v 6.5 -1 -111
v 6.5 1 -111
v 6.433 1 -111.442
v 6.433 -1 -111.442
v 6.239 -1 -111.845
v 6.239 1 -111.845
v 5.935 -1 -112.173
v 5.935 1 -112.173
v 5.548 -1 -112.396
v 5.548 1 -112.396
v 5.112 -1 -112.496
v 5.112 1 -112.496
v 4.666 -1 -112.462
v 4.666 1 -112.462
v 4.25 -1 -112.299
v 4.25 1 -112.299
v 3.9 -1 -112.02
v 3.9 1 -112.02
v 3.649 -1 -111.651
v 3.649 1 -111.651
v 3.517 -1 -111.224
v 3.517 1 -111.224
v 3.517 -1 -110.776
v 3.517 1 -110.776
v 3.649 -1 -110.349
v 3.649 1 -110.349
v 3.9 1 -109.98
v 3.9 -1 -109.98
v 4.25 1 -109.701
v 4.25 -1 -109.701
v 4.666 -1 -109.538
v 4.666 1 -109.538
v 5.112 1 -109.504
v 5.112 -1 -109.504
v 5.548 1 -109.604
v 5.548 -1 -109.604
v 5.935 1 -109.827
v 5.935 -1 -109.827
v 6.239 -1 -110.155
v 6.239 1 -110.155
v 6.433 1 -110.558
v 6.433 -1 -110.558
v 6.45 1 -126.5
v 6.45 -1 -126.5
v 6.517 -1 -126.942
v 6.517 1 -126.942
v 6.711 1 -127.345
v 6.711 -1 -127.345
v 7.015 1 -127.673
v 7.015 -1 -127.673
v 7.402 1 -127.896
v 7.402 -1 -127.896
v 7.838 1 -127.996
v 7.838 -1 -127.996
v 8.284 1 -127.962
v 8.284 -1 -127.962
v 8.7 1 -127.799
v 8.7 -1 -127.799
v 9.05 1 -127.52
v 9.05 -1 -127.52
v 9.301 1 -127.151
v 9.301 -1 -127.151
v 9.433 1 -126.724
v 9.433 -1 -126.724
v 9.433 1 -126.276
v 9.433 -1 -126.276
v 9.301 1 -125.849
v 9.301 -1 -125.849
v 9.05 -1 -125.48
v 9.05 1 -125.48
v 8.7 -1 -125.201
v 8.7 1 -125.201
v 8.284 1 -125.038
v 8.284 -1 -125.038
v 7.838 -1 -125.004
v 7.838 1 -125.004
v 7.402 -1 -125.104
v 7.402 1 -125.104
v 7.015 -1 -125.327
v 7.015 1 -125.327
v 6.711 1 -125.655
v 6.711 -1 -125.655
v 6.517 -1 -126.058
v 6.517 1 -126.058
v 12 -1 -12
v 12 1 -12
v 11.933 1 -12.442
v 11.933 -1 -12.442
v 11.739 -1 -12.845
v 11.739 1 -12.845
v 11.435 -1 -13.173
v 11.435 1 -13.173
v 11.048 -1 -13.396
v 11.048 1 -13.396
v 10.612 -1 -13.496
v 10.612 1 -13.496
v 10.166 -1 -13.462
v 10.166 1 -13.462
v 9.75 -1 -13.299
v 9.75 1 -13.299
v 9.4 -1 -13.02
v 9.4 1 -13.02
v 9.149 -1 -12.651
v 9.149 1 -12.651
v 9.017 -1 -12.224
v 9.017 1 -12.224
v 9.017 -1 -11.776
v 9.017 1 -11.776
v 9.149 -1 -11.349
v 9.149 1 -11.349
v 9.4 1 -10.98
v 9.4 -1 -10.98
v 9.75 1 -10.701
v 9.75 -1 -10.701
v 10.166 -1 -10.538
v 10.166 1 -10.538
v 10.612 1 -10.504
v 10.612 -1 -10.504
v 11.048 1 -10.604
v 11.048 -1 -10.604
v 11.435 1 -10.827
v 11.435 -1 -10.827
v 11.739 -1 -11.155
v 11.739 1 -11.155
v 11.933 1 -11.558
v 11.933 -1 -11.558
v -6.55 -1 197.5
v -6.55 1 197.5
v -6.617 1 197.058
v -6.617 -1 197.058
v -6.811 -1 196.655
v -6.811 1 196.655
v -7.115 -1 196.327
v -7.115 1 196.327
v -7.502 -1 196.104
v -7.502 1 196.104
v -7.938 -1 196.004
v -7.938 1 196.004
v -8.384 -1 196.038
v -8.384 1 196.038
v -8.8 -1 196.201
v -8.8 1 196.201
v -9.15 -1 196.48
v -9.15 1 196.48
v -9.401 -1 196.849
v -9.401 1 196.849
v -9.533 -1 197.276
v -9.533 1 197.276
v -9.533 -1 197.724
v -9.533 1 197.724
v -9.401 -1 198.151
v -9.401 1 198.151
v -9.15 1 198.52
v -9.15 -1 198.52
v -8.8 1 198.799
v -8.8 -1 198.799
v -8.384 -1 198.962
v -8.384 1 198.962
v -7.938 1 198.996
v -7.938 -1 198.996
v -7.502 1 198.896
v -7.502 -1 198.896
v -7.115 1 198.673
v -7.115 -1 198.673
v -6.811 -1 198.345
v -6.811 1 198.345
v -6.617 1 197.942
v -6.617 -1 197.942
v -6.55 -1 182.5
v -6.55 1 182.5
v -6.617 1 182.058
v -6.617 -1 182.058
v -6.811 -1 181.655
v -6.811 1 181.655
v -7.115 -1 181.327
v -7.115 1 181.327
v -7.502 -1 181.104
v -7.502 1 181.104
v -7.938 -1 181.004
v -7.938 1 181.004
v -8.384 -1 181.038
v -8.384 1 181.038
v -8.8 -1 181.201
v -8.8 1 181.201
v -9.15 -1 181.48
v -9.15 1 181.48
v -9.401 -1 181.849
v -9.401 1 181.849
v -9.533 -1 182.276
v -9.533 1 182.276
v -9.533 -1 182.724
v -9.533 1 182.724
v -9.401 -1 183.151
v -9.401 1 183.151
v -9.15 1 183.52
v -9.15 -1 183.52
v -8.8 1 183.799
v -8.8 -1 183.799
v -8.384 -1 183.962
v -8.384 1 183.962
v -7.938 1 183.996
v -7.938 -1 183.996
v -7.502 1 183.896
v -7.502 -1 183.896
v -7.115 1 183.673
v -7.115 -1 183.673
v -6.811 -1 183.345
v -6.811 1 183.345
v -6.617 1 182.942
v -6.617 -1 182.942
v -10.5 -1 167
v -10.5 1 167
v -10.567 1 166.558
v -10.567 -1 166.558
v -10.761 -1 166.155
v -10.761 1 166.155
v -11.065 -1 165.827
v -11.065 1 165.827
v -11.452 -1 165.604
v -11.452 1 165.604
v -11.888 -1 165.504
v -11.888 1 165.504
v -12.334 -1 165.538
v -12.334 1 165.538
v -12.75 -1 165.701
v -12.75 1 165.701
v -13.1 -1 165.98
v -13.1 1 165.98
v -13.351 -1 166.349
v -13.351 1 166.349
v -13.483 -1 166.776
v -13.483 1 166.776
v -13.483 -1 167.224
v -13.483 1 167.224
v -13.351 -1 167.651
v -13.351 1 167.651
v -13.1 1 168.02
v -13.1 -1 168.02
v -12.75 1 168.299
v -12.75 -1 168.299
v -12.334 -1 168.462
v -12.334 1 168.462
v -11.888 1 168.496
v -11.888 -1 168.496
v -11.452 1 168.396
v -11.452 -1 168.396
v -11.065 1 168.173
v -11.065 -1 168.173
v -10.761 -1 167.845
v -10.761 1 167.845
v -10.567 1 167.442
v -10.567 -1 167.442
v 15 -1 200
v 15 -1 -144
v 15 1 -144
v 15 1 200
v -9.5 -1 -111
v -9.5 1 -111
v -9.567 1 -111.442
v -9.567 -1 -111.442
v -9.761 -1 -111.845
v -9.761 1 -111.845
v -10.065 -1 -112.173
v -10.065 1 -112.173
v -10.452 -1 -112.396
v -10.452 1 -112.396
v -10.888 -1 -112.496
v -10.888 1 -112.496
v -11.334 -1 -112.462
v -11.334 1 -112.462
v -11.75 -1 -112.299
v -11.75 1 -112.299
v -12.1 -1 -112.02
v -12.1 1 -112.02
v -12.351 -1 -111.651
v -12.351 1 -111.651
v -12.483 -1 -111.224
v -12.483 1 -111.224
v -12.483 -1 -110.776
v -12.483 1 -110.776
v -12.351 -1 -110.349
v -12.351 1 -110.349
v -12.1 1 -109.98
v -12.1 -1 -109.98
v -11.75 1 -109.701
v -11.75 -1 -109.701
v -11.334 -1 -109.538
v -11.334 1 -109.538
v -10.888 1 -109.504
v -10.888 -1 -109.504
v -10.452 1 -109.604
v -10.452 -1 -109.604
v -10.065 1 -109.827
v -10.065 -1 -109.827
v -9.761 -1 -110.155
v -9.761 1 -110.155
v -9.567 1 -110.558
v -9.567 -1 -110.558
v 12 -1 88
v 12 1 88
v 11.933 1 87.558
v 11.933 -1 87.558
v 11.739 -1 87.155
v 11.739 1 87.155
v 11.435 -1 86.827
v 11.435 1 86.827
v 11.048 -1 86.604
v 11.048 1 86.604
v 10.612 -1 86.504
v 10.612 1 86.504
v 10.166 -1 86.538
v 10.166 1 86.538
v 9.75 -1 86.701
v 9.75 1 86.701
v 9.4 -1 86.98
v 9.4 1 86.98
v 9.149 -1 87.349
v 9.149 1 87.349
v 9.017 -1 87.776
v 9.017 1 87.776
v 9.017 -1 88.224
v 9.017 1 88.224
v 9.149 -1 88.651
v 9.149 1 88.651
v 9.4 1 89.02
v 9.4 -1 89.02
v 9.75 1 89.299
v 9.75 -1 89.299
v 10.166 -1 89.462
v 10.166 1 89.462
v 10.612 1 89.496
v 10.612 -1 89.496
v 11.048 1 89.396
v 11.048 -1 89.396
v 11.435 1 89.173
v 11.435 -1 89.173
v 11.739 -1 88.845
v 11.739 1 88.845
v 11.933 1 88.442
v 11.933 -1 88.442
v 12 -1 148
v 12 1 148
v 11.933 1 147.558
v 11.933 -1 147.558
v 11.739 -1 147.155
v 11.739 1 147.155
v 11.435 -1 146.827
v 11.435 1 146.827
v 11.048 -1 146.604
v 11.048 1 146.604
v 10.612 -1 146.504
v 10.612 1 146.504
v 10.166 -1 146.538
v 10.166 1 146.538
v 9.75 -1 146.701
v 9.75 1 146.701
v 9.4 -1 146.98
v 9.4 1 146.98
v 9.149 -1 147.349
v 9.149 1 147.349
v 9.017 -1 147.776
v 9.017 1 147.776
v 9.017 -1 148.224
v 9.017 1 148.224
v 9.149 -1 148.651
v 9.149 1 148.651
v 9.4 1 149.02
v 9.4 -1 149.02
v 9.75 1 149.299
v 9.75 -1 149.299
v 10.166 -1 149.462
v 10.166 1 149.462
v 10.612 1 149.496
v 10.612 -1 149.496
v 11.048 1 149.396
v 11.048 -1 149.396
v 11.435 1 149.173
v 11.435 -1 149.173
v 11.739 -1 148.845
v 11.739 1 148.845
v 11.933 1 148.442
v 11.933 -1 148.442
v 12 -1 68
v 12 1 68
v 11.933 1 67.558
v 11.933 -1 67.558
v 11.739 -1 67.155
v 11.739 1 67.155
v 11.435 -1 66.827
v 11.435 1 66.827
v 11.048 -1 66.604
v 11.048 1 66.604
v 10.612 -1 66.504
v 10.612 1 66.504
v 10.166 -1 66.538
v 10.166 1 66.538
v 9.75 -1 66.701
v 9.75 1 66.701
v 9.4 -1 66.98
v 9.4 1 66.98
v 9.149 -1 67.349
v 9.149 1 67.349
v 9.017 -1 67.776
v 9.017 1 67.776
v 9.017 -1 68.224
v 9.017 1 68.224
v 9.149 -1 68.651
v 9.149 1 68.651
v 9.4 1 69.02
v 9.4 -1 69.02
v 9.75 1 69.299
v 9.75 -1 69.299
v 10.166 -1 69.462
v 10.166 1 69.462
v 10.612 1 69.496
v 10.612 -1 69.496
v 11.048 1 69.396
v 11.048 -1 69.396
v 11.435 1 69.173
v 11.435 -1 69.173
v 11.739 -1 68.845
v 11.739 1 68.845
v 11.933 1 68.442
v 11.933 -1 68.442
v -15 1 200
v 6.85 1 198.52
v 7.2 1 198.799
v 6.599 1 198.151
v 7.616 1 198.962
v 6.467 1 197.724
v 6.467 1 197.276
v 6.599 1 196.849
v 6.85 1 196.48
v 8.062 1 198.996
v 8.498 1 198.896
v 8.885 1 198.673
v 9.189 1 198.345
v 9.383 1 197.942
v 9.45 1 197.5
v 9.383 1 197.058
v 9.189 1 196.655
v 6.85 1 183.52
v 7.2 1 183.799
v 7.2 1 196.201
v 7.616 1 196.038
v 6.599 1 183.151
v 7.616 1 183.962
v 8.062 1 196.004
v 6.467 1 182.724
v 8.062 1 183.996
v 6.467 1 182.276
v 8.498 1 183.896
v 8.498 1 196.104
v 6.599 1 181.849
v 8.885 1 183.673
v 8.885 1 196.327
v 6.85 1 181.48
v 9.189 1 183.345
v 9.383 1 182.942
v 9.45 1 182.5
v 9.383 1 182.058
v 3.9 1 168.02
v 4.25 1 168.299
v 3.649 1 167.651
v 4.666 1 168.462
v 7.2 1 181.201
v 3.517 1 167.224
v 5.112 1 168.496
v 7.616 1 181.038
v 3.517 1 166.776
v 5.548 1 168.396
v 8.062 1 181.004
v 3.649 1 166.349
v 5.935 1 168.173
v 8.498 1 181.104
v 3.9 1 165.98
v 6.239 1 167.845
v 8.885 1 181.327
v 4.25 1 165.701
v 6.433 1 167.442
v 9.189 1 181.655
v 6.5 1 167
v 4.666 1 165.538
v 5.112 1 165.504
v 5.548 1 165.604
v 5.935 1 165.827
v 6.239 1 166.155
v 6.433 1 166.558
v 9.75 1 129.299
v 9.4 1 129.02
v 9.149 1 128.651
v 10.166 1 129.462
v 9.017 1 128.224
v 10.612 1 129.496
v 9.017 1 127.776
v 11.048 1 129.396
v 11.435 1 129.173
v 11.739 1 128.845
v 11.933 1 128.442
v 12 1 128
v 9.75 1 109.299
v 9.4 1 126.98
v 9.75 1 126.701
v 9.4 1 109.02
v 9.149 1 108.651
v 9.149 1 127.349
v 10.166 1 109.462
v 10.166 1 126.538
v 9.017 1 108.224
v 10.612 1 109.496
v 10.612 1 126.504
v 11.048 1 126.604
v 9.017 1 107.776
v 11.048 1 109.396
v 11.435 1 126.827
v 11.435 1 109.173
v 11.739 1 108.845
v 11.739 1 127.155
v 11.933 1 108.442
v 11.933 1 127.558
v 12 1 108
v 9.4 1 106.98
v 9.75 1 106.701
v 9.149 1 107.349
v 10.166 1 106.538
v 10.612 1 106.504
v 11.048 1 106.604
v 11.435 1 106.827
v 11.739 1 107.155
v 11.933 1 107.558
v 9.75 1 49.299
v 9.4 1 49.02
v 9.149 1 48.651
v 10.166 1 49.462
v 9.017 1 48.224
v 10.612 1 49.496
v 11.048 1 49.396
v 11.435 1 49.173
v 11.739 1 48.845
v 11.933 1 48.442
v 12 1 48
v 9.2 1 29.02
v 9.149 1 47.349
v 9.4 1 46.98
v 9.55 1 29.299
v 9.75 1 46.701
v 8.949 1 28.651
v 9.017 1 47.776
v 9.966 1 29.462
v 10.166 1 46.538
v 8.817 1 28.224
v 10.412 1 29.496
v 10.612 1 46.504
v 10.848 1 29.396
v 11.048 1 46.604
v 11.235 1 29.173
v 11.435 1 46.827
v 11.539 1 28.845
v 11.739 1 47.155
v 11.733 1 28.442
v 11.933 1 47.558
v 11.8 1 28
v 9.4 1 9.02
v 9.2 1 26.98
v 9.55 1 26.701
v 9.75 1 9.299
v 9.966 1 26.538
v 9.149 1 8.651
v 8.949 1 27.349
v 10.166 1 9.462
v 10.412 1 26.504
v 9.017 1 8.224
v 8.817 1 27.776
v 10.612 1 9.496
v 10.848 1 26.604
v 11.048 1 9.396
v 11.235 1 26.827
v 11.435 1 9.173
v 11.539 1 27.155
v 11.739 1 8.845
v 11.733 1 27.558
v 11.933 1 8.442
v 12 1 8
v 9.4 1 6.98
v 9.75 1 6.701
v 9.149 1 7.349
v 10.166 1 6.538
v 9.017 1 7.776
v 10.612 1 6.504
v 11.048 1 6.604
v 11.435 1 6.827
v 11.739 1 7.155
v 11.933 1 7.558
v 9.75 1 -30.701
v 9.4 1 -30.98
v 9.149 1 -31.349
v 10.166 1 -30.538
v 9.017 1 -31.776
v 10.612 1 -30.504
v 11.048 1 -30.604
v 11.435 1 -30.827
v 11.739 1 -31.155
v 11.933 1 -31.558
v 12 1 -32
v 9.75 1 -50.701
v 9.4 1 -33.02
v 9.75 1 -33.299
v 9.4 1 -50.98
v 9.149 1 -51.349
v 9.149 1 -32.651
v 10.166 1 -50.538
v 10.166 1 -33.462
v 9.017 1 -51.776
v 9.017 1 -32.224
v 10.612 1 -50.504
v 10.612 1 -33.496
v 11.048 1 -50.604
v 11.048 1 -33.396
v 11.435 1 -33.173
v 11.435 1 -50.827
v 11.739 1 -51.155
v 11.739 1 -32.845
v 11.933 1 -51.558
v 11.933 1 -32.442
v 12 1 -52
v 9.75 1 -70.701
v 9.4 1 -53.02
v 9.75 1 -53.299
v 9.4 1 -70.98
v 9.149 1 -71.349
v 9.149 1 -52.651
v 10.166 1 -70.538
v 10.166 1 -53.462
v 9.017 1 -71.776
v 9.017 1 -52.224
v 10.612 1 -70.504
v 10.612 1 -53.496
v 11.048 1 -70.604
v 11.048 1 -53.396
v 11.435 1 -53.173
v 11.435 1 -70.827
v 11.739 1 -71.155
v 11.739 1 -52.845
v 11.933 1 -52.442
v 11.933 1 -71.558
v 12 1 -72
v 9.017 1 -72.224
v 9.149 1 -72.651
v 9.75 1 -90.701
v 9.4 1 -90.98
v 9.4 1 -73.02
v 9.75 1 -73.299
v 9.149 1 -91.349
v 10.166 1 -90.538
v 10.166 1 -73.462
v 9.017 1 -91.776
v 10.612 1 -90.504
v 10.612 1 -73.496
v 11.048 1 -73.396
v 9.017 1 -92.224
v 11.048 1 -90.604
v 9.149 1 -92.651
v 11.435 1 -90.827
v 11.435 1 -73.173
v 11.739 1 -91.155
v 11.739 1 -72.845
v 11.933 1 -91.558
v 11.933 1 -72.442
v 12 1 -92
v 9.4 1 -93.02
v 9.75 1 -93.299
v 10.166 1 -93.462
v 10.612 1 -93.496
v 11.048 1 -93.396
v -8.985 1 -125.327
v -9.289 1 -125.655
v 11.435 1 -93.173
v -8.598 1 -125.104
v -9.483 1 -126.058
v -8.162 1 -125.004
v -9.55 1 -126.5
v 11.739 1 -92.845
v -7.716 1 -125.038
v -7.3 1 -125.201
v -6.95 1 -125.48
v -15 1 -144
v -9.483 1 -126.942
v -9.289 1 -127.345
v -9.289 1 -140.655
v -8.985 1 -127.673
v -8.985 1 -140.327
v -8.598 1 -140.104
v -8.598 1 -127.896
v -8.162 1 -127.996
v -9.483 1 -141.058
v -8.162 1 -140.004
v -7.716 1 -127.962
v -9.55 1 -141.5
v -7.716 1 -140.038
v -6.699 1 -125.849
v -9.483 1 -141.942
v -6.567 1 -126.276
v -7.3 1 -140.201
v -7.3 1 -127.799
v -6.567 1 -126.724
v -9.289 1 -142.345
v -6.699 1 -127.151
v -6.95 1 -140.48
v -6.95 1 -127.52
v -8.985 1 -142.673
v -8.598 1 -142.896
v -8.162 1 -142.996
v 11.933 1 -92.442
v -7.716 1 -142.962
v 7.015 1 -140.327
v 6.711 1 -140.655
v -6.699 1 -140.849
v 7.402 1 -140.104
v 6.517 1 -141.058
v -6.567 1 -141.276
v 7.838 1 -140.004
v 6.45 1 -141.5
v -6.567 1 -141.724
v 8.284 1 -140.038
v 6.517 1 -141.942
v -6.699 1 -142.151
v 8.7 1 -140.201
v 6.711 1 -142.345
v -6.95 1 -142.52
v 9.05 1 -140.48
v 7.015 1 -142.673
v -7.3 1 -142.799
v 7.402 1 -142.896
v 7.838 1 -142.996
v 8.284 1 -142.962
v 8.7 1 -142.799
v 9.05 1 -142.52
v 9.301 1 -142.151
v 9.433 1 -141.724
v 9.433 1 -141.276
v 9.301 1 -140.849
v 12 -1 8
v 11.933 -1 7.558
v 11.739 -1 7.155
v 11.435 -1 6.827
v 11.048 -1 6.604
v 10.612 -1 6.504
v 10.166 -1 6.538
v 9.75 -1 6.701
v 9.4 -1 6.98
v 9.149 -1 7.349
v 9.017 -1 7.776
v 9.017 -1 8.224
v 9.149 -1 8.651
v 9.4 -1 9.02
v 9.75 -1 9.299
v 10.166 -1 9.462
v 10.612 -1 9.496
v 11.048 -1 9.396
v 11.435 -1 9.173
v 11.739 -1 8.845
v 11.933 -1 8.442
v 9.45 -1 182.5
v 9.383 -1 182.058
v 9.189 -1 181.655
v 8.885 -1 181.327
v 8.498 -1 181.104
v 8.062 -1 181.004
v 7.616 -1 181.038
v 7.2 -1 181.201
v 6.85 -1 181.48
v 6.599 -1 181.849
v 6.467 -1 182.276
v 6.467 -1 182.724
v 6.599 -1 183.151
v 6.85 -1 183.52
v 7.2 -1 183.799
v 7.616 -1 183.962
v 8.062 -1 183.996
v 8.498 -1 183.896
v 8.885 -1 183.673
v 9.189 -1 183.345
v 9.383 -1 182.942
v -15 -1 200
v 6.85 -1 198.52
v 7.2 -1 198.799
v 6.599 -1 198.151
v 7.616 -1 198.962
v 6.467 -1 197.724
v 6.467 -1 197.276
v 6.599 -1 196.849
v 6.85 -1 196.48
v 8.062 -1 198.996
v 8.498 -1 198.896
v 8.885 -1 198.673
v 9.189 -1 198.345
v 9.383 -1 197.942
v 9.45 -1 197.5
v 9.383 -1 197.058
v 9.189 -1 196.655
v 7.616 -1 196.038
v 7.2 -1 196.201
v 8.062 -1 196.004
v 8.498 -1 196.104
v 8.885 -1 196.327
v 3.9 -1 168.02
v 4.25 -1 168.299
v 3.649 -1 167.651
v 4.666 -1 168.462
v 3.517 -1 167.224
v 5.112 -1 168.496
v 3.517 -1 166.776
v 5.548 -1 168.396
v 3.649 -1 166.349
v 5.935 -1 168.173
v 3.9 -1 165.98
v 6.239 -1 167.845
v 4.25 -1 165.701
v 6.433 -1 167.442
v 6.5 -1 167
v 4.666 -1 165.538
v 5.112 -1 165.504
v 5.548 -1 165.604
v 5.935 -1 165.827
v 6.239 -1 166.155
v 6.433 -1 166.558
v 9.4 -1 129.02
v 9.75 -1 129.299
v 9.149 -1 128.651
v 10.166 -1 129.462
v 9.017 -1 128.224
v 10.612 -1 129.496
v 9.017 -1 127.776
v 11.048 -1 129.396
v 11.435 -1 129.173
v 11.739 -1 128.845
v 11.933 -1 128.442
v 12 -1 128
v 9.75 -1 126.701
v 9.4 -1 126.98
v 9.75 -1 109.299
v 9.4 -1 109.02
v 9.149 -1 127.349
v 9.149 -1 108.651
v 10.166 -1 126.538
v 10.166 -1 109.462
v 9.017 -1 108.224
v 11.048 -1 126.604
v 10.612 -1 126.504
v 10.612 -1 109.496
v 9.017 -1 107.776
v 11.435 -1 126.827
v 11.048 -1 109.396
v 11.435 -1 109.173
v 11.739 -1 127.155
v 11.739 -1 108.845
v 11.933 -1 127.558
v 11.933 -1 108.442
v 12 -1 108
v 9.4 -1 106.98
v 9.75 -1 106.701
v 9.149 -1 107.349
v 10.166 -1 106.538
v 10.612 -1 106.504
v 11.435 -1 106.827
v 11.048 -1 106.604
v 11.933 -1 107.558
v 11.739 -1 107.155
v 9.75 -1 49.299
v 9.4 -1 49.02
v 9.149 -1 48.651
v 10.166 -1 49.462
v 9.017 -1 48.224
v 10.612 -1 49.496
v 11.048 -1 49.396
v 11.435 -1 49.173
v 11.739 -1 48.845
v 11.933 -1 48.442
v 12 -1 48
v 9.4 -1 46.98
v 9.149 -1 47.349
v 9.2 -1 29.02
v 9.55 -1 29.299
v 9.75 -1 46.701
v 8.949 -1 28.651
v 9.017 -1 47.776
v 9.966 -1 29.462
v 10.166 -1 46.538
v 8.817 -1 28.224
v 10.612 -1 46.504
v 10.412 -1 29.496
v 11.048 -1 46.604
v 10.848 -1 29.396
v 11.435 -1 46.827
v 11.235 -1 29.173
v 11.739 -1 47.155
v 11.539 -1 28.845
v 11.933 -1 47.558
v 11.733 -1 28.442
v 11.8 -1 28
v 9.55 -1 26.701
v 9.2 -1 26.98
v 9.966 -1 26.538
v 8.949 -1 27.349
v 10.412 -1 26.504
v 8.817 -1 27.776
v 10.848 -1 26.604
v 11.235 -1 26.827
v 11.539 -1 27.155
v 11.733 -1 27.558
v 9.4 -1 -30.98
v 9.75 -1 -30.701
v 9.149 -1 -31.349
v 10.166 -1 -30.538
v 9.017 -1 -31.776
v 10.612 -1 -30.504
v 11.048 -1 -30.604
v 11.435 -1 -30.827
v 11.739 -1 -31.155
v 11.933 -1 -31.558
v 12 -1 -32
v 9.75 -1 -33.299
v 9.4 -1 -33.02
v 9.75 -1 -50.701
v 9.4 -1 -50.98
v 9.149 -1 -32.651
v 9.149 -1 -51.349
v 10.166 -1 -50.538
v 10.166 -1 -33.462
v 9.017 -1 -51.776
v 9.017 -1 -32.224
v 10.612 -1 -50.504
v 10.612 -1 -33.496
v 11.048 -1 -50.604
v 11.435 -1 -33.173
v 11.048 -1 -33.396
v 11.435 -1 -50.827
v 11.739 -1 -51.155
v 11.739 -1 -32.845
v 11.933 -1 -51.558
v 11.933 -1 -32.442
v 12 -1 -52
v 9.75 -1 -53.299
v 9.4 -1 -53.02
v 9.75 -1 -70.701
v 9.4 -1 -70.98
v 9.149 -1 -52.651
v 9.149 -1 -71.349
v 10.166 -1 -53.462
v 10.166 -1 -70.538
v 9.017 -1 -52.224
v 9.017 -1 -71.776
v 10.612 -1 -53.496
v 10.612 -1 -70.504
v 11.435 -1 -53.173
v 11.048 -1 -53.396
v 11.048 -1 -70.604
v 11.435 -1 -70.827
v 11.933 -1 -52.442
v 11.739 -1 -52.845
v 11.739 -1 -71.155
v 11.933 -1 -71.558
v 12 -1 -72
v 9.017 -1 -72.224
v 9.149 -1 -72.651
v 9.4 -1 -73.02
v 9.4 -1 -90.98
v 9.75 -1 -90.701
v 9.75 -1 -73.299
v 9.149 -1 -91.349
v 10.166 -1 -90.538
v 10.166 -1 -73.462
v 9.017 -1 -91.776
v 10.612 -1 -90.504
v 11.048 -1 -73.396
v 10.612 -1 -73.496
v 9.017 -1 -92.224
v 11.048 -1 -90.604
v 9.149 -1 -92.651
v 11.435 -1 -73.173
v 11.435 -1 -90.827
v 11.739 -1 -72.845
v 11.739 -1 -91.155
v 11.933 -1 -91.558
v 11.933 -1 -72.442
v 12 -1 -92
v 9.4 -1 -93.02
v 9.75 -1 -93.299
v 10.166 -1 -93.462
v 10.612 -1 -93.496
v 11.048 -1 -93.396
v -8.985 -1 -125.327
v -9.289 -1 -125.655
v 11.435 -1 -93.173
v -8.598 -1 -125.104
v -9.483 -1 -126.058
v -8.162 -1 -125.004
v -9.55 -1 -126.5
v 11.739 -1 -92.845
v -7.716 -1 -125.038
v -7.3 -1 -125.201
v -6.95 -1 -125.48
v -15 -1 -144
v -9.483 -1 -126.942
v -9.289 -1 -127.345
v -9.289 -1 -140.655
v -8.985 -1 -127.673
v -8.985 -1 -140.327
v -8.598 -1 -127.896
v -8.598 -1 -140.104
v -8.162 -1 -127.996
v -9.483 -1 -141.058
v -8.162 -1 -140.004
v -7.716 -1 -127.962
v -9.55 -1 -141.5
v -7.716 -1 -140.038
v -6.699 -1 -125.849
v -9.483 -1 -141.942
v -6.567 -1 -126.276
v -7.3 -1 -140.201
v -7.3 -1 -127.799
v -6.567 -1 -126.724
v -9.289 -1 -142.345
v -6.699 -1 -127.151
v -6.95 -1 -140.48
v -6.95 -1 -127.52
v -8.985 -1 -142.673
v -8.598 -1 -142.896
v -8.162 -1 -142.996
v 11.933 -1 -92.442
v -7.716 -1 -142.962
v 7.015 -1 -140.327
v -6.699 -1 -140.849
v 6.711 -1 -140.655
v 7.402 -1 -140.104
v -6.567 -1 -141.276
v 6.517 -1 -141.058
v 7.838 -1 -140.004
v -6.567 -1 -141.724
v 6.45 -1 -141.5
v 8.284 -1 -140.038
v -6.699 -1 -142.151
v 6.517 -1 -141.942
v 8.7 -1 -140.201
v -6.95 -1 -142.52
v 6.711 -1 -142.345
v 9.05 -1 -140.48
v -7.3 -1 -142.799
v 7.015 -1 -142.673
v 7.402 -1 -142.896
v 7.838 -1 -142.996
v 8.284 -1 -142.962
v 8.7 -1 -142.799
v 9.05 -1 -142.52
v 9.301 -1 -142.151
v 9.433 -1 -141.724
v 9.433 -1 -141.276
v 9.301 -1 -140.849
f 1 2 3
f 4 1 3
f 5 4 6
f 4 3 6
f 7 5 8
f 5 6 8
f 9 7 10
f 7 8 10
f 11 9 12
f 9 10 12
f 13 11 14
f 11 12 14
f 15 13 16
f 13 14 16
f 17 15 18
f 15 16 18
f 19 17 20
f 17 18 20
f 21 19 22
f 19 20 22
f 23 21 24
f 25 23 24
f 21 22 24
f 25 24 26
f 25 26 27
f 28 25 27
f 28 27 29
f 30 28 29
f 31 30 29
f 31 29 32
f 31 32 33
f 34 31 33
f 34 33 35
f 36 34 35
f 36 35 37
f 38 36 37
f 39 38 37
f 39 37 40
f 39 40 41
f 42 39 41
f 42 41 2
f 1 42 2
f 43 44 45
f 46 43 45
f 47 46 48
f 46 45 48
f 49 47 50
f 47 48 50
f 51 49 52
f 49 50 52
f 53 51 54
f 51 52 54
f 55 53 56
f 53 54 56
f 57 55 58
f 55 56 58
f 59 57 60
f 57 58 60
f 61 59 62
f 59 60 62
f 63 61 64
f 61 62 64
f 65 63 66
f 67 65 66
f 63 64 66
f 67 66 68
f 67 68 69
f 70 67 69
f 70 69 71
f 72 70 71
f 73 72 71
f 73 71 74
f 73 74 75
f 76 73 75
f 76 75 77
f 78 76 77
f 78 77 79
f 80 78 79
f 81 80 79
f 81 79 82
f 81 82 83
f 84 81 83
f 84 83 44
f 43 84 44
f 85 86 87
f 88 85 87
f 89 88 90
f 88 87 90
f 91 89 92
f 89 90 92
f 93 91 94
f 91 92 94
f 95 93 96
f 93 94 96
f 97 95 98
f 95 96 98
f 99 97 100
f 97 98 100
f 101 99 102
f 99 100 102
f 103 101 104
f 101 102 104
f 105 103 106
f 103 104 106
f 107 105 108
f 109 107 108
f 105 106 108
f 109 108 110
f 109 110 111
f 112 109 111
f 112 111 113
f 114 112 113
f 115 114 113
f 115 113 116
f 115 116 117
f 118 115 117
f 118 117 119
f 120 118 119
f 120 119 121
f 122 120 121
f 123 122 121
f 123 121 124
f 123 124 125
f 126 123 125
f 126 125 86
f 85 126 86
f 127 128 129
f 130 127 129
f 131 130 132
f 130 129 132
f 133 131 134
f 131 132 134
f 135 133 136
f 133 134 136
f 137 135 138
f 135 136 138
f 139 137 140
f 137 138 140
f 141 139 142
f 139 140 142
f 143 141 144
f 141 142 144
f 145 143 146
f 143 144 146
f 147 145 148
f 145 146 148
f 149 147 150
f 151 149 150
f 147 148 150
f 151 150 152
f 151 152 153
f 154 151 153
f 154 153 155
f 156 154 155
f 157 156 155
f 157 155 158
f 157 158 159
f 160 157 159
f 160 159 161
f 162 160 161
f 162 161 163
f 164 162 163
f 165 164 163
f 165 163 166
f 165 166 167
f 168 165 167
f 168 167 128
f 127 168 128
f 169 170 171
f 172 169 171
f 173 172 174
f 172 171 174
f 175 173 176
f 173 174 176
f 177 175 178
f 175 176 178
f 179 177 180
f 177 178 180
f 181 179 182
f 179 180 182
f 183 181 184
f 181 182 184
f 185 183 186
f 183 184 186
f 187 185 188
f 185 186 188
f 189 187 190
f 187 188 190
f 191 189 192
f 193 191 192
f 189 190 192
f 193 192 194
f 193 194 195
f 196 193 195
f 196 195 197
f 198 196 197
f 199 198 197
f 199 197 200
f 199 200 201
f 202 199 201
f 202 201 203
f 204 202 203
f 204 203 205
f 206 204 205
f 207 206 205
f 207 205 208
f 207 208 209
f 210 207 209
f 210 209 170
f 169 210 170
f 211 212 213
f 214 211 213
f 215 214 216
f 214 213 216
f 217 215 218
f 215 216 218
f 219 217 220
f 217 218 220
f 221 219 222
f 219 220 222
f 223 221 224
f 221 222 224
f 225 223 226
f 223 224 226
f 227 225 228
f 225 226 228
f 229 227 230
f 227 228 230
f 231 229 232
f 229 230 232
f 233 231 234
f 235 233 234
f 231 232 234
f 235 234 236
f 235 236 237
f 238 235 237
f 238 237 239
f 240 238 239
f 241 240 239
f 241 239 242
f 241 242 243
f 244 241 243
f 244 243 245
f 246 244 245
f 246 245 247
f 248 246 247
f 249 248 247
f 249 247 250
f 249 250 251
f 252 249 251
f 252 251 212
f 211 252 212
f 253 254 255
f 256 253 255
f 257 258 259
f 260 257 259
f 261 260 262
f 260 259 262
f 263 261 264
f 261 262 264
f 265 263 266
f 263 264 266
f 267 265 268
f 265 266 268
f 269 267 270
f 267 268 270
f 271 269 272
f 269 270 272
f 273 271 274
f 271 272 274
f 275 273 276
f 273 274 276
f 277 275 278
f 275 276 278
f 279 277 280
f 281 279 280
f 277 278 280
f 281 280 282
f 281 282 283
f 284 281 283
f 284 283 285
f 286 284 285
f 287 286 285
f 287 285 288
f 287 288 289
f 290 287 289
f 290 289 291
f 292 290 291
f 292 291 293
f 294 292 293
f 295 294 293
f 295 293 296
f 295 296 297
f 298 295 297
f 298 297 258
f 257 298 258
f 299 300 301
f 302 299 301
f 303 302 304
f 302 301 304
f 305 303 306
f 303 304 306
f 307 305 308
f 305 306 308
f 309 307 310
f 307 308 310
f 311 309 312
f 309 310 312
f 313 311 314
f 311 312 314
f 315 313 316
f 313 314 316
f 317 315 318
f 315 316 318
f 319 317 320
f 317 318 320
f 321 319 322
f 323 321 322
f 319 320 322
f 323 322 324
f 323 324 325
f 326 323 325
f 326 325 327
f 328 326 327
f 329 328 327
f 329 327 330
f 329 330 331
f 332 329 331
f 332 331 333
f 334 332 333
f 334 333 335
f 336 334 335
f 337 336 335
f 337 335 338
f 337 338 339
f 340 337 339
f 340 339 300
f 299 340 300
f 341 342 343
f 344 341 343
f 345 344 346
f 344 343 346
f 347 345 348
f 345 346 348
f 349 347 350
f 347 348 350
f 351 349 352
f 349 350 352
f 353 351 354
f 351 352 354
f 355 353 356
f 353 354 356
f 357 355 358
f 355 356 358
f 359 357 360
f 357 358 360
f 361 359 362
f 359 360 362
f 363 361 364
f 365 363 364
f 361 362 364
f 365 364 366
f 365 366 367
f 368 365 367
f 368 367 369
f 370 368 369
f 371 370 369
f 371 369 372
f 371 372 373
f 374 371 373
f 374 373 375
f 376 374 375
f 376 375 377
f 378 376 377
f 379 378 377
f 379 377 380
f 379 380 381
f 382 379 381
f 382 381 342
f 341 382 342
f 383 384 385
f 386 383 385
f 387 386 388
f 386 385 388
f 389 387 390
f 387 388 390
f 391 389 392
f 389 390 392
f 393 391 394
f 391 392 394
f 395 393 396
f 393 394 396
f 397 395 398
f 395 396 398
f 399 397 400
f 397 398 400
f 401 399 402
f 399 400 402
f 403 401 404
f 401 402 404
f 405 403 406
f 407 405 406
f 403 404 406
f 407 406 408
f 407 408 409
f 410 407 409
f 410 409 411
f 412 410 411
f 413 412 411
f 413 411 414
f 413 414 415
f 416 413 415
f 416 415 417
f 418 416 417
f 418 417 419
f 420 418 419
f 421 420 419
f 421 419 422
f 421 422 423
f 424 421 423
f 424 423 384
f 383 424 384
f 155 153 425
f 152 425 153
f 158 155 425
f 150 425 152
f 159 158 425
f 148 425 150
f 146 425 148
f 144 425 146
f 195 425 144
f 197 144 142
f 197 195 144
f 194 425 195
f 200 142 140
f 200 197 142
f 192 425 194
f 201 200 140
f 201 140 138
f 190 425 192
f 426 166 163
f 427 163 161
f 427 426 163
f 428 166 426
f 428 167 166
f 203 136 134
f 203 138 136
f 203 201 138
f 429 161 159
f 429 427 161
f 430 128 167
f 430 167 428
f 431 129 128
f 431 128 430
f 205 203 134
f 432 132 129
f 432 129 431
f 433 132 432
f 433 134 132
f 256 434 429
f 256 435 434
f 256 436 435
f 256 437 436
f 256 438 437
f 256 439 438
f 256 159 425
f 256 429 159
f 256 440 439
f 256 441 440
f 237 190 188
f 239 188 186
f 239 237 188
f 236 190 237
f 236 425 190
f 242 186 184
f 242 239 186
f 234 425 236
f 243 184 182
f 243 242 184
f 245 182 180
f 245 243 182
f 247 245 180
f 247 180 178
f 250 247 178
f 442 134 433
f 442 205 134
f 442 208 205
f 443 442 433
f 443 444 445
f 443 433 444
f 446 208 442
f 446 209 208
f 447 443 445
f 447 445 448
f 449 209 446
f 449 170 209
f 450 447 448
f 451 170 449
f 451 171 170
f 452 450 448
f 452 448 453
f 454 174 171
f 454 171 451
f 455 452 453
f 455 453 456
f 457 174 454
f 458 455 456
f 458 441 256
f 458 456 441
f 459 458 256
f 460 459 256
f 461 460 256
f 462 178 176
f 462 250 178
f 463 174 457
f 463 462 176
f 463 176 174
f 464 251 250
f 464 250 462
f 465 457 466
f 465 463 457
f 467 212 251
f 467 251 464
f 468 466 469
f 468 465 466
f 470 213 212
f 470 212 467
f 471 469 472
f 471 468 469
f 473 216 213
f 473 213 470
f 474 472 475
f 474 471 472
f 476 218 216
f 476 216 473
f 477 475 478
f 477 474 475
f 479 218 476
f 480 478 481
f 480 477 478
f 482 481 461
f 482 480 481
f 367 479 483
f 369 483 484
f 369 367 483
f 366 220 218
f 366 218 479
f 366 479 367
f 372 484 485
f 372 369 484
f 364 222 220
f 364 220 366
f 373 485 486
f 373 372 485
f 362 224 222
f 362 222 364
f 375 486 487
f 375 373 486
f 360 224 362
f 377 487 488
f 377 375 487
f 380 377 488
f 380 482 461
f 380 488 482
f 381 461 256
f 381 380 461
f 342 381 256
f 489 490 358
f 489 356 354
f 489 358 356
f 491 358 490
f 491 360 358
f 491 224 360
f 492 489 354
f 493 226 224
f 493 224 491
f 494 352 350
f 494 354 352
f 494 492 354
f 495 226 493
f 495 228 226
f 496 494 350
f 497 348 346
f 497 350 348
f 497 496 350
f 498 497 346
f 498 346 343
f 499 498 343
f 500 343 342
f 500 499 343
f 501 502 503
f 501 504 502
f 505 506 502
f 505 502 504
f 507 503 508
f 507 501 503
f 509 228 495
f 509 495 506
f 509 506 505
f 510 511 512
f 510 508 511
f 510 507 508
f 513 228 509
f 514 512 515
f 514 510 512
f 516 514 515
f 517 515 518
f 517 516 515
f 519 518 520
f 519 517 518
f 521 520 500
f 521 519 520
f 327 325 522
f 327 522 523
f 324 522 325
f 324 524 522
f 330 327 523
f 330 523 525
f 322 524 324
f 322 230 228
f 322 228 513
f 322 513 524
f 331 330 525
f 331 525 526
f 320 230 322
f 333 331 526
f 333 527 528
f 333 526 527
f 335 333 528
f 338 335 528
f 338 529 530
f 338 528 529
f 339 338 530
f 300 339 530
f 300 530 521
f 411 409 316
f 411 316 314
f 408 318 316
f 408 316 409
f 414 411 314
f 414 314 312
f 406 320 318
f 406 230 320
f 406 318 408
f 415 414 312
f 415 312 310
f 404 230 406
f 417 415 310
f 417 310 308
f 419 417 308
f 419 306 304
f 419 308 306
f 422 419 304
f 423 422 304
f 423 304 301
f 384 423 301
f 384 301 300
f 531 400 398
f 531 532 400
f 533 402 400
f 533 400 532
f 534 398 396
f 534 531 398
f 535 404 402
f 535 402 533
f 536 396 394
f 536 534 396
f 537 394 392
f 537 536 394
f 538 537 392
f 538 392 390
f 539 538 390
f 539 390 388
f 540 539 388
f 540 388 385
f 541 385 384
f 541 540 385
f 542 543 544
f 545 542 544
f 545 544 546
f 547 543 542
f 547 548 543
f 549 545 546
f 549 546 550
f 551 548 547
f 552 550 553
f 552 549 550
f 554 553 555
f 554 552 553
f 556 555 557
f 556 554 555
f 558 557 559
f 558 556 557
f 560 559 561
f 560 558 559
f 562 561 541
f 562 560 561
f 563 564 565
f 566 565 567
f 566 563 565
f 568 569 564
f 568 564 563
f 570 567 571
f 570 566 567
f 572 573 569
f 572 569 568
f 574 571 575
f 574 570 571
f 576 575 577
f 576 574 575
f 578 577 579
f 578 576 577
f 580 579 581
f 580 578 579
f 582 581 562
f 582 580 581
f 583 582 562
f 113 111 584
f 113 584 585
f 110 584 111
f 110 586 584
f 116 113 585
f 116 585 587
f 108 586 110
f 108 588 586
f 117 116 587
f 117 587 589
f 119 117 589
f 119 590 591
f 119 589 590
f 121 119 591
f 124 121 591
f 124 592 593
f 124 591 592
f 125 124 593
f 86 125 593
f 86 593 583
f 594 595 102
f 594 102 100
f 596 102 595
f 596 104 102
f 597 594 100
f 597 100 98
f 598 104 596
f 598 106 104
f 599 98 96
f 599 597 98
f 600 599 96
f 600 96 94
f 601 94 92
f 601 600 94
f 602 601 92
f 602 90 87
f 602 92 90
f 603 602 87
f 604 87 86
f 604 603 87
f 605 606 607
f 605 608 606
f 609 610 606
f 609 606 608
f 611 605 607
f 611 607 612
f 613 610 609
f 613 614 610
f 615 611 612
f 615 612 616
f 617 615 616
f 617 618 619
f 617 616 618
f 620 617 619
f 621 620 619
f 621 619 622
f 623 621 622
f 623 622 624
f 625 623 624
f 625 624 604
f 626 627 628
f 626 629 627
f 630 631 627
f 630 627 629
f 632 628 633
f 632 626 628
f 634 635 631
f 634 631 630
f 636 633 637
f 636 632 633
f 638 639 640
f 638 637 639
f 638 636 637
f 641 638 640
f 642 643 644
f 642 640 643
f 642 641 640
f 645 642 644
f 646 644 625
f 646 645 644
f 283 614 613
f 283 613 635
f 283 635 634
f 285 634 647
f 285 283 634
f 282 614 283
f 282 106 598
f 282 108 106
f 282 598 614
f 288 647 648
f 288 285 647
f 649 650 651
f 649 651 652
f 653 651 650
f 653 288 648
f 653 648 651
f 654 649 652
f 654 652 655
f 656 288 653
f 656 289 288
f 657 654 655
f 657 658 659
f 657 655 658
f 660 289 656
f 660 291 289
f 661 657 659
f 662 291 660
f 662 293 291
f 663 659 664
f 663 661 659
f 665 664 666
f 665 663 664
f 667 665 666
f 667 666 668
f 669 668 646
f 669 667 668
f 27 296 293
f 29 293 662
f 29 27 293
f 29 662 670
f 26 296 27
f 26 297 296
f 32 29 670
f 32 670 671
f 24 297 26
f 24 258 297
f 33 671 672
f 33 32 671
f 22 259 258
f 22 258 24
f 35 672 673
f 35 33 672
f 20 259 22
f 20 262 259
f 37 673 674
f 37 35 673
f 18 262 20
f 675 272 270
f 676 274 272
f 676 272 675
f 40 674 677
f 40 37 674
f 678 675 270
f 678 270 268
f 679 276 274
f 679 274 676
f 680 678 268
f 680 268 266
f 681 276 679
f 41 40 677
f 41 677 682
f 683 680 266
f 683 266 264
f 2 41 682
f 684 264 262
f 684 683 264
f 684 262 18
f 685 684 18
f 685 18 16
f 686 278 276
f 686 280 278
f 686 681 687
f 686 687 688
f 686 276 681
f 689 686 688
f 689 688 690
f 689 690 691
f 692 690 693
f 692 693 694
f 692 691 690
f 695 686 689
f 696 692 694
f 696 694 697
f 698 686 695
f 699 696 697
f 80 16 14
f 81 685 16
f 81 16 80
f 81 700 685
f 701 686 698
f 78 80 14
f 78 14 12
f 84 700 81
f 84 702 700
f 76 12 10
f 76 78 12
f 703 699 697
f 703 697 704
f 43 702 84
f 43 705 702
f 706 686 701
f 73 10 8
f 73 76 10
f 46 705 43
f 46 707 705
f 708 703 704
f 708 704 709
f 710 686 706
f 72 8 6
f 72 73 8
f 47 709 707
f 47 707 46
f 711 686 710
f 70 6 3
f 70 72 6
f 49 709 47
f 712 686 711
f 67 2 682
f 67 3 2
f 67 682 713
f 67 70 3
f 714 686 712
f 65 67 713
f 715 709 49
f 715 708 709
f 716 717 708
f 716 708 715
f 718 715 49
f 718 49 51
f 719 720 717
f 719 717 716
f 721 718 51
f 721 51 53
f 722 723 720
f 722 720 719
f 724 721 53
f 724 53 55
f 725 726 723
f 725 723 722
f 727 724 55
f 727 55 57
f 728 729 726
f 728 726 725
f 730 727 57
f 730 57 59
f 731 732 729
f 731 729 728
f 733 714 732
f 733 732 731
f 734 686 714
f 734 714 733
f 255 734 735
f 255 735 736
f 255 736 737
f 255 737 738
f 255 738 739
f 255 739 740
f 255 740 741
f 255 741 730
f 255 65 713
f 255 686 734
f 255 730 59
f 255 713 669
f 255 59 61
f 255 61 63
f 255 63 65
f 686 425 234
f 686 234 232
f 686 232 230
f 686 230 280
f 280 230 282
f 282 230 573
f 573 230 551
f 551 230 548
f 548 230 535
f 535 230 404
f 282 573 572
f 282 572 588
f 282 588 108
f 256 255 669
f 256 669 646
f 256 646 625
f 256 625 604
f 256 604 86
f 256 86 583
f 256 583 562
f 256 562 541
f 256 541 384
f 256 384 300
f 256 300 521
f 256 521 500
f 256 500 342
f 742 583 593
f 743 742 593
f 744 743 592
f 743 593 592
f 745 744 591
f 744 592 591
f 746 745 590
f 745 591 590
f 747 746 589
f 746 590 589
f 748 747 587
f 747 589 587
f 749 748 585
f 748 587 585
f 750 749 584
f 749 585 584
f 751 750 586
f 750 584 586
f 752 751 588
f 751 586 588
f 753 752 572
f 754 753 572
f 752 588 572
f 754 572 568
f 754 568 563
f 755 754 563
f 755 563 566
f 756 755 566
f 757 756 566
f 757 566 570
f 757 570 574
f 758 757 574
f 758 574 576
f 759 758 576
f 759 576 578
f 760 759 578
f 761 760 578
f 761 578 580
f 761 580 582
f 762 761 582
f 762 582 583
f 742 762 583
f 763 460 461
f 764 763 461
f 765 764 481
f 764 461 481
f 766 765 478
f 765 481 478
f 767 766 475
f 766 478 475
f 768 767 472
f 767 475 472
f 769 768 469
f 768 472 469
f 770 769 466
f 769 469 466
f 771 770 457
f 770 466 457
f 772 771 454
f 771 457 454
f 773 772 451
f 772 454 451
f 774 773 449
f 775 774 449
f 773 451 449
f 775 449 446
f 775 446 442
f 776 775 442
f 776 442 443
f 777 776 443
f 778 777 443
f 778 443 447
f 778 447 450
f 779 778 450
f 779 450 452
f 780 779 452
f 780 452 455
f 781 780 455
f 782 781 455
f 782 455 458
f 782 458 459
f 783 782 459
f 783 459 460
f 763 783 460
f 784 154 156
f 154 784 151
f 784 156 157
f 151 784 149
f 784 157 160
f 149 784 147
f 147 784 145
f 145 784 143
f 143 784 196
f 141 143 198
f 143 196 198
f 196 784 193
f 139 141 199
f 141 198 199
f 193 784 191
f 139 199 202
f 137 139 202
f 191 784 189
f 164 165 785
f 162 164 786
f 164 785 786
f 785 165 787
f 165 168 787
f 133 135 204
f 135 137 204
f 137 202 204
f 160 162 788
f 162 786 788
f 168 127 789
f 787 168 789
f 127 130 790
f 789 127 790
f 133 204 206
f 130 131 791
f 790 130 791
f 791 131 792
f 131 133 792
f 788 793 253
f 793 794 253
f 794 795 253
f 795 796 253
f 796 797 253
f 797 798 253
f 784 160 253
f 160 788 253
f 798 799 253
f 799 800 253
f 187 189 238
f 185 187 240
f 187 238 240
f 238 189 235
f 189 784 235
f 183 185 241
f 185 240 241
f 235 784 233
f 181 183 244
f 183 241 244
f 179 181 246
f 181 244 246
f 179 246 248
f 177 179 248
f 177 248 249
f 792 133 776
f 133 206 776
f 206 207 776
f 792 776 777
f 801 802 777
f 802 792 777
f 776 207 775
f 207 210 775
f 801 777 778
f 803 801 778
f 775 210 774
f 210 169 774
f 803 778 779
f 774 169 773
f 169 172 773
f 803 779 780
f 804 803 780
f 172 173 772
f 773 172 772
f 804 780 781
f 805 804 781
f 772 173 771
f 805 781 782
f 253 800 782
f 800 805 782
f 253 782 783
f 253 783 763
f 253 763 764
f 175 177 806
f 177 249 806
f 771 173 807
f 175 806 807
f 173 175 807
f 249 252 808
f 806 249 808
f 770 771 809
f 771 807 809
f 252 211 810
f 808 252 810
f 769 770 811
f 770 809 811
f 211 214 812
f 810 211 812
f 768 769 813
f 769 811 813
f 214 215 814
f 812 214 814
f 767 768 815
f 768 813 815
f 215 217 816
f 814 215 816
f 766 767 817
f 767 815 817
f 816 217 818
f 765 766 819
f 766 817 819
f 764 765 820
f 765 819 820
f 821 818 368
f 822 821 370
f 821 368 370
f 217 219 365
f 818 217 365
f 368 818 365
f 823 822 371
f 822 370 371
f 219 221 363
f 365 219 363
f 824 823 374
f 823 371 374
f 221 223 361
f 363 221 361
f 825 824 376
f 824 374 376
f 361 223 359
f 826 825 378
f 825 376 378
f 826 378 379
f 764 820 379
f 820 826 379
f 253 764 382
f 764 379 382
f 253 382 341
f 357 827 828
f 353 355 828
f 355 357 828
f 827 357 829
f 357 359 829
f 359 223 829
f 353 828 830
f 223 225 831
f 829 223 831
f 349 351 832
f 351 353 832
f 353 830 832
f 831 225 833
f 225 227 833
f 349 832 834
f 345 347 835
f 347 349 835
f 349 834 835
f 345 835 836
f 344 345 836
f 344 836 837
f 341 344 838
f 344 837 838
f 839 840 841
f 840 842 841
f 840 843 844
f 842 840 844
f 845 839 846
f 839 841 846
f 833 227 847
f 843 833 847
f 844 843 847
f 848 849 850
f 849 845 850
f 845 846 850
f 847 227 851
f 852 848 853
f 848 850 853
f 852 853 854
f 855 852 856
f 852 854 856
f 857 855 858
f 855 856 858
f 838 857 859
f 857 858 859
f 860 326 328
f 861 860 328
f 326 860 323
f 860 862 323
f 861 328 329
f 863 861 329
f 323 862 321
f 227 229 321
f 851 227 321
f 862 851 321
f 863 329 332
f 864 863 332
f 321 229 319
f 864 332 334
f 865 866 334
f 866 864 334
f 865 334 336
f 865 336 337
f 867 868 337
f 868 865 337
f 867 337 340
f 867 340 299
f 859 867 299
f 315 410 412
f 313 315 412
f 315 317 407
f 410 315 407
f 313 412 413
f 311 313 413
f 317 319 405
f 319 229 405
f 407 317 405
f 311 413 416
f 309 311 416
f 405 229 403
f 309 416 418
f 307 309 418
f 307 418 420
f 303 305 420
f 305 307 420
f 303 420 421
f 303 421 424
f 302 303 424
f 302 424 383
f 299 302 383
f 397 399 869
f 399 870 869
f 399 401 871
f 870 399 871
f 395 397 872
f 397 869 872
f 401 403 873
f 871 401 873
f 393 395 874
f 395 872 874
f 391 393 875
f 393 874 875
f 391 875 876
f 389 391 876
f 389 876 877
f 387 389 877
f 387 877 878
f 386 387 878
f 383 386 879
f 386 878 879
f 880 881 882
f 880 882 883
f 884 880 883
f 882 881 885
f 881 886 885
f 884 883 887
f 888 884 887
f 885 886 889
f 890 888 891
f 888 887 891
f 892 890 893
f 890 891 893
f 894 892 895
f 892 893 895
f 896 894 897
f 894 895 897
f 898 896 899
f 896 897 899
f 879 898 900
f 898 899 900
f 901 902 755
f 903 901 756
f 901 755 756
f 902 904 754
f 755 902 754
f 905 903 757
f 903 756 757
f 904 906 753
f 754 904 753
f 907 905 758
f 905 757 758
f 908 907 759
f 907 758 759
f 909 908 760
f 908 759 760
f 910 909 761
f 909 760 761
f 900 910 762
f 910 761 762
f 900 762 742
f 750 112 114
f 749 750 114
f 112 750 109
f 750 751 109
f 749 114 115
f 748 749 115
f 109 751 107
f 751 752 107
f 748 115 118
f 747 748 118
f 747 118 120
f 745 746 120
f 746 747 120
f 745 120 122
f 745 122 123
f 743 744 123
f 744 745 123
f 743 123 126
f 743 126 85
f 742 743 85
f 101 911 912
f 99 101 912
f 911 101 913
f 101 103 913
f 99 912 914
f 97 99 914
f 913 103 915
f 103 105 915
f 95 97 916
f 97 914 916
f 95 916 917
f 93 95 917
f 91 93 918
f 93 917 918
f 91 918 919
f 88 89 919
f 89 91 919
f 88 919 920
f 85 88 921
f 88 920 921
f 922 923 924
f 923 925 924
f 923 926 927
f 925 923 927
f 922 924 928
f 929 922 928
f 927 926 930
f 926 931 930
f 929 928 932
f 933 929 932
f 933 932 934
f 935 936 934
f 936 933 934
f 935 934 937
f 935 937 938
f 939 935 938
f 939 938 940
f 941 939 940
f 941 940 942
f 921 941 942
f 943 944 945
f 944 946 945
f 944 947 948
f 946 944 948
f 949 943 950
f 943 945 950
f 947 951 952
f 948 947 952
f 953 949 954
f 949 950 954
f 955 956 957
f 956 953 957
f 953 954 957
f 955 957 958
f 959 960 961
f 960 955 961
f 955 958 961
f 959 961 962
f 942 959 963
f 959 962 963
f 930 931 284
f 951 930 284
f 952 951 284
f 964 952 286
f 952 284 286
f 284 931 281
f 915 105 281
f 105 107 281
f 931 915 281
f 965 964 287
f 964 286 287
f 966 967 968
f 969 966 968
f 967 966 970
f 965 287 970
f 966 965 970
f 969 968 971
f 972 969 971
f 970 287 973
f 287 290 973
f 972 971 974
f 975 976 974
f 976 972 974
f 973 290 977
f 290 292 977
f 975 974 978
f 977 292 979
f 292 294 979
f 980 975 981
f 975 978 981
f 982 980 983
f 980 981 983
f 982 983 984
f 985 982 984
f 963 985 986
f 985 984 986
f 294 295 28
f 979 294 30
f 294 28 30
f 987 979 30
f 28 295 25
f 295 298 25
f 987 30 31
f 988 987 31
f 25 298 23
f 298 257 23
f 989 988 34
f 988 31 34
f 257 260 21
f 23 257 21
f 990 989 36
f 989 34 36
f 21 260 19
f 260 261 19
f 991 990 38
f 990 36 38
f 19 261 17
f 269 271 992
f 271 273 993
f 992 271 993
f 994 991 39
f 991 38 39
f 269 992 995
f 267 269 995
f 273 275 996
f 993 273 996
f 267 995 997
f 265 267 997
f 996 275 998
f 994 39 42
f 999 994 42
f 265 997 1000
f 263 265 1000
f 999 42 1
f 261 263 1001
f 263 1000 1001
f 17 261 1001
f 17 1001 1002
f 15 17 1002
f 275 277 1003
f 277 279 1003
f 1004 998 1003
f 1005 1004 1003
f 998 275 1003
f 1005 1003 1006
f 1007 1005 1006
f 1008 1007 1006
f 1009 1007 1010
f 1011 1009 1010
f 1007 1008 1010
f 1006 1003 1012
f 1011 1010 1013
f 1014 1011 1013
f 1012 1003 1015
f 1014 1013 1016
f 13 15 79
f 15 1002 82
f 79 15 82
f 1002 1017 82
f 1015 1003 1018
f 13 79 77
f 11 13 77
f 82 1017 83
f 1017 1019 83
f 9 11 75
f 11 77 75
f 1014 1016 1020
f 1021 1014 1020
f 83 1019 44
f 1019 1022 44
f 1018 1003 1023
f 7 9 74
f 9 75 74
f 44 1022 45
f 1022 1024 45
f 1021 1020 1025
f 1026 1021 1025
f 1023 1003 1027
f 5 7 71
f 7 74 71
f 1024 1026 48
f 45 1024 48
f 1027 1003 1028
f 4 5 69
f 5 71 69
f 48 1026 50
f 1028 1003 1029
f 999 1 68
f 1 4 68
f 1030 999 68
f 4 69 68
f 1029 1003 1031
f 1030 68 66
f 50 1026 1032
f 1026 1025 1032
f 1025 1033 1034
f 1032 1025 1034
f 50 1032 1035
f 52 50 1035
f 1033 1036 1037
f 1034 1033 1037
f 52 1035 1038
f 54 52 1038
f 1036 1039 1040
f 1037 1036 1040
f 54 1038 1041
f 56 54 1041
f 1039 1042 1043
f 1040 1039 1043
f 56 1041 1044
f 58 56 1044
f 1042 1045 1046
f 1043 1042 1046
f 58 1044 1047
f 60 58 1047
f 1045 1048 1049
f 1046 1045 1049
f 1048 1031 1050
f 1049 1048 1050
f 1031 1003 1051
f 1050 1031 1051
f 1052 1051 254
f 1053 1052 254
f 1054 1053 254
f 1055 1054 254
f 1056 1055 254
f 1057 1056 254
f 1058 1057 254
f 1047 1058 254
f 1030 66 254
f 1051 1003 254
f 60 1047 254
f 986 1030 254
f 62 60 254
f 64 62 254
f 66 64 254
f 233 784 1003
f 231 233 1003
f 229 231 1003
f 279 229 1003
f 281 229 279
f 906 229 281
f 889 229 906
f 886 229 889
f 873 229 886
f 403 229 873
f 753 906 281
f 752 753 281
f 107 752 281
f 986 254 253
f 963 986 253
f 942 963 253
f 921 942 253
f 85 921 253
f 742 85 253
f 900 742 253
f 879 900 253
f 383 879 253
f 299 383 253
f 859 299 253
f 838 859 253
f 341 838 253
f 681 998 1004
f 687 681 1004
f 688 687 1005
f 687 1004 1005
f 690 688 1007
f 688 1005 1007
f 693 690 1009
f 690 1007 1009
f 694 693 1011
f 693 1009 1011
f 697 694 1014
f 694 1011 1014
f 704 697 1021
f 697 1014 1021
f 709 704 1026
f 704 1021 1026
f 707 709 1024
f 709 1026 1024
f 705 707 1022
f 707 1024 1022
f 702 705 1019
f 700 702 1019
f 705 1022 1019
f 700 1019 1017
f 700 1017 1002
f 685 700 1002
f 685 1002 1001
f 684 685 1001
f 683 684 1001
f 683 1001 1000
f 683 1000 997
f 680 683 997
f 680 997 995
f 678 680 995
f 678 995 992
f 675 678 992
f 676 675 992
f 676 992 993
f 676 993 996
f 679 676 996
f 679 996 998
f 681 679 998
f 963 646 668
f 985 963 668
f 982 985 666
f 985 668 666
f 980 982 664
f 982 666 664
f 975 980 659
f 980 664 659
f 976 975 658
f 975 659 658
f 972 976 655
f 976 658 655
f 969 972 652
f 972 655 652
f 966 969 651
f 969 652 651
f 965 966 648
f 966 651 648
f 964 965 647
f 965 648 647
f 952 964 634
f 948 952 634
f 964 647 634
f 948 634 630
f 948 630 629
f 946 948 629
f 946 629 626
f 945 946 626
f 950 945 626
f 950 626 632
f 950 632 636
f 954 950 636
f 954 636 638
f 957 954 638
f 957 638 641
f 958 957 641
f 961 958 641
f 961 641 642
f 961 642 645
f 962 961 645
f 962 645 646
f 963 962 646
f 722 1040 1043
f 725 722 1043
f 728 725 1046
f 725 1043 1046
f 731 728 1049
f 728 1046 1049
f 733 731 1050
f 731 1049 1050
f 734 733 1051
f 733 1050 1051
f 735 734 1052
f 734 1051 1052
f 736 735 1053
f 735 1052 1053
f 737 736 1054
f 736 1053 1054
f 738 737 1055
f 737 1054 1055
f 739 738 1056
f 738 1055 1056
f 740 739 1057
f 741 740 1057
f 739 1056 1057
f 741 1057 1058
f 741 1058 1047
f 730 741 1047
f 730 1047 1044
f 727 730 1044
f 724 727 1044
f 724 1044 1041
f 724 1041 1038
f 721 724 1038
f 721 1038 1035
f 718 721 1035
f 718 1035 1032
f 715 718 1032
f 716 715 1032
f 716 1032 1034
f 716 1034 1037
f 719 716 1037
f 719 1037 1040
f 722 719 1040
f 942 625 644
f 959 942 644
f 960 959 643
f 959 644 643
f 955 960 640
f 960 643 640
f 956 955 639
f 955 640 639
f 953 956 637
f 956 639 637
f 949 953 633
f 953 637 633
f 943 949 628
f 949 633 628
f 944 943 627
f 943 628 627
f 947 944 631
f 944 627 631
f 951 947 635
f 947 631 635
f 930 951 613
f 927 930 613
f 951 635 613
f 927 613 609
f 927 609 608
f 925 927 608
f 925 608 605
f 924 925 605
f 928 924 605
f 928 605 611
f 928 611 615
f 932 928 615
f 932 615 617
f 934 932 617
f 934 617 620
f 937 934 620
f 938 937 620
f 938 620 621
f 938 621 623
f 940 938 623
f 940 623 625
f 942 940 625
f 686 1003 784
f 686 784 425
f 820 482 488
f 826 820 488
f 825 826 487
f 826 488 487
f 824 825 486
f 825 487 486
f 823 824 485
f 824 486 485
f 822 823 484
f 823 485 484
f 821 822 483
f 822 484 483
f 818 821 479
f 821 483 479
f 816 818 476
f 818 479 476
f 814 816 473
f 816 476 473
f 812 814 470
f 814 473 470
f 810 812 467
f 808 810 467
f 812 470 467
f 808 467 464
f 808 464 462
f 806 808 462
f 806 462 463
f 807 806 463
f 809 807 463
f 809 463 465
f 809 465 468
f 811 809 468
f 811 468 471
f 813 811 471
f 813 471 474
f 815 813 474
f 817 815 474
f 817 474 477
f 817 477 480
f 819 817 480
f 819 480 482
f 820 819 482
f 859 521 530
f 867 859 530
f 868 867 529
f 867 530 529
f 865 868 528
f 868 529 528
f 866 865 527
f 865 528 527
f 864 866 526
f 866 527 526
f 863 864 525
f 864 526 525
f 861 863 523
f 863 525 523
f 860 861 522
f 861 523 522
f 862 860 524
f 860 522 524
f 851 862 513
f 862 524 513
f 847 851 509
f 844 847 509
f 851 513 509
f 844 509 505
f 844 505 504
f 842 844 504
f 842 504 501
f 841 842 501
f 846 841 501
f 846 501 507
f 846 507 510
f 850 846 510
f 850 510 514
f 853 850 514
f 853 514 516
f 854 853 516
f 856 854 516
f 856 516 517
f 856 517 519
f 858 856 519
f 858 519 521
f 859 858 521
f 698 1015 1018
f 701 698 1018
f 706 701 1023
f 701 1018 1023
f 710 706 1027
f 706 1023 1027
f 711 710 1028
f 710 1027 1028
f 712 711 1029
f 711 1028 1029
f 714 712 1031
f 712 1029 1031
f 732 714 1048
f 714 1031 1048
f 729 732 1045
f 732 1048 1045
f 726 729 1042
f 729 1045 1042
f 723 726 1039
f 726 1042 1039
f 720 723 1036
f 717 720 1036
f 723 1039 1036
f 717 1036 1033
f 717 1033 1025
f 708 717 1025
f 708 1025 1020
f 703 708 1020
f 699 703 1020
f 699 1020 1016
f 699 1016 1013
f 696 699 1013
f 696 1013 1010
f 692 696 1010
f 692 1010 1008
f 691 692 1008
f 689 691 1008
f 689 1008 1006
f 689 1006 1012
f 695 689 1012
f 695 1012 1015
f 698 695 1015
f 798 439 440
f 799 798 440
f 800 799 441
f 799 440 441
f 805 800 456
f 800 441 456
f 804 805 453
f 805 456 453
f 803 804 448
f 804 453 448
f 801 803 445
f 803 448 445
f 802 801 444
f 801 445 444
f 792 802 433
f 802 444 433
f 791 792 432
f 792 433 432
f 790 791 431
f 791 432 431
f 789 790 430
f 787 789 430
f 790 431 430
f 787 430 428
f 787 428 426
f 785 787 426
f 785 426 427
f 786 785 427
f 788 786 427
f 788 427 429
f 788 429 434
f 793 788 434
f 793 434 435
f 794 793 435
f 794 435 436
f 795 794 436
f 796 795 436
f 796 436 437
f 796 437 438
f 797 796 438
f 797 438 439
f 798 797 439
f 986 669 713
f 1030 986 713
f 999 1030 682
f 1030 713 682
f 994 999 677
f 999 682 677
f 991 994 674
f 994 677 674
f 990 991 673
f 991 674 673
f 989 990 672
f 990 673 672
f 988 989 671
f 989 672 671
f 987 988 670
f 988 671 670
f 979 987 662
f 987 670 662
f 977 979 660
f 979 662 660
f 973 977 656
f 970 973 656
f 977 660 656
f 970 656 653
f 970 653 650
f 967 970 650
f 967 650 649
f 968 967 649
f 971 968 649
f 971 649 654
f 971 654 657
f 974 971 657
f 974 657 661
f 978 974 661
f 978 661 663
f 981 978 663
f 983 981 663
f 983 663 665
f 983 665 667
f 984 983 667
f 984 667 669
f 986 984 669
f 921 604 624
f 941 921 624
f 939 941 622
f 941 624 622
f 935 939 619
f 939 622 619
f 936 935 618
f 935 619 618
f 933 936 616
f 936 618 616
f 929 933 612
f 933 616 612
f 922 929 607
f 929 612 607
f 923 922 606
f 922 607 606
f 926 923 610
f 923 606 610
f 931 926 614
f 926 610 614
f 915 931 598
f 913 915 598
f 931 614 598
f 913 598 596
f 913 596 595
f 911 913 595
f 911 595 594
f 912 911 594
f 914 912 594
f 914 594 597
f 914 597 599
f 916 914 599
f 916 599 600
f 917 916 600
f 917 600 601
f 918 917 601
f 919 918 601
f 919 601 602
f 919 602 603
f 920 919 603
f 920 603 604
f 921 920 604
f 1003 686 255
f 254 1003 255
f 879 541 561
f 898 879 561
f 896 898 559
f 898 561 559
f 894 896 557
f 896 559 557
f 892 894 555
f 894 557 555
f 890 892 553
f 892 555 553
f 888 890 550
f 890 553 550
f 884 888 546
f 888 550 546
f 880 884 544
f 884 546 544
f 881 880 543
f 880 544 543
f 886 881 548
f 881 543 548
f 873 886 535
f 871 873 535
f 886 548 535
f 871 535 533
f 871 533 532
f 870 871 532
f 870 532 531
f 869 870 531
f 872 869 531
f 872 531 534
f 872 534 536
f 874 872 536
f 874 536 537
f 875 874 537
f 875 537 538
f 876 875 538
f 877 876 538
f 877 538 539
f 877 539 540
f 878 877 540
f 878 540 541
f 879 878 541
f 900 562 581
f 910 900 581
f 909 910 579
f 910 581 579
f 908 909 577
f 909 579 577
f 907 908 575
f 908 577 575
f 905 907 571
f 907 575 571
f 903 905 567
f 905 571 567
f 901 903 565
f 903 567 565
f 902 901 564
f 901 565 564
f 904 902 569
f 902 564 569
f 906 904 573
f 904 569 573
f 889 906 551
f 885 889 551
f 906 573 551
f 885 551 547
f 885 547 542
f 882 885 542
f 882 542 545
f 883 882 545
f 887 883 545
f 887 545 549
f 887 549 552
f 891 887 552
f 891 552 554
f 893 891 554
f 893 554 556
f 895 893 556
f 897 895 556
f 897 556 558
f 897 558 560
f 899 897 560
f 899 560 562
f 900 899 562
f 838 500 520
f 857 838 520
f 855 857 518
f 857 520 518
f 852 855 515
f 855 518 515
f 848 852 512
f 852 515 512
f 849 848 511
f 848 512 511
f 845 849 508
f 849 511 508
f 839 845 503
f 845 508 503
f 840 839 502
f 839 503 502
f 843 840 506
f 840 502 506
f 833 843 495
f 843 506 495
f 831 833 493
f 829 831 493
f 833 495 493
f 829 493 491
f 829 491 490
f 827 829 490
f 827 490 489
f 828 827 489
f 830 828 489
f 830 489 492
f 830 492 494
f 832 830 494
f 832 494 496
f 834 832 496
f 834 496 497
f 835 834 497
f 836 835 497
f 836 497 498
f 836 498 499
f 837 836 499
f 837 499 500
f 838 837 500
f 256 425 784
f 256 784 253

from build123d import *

# Parameters (mm, degrees)
BOSS_EXTRUDE1_DEPTH      = 200
BOSS_EXTRUDE1_DEPTH_BACK = 144
SKETCH1_W                = 30
SKETCH1_H                = 2
F_3_0_3_DIAMETER_SLOT1_D = 3
F_3_0MM_DOWEL_HOLE1_D    = 3


with BuildPart() as part:
    # Sketch1 → Boss-Extrude1 (new, two sides: drawn at the far end of the back side and taken through both)
    with BuildSketch(Plane.XY.offset(-BOSS_EXTRUDE1_DEPTH_BACK)):
        Rectangle(SKETCH1_W, SKETCH1_H)
    extrude(amount=BOSS_EXTRUDE1_DEPTH + BOSS_EXTRUDE1_DEPTH_BACK)

    # Ø3.0 (3) Diameter Slot1 (through all)
    with Locations(Plane(origin=(0, 1, 0), x_dir=(1, 0, 0), z_dir=(0, 1, 0))):
        with Locations((-8.05, 126.5), (7.95, 126.5), (7.95, 141.5), (-8.05, 141.5)):
            Hole(F_3_0_3_DIAMETER_SLOT1_D / 2)

    # Ø3.0mm Dowel Hole1 (through all)
    with Locations(Plane(origin=(0, -1, 0), x_dir=(-1, 0, 0), z_dir=(0, -1, 0))):
        with Locations((-7.95, -197.5), (8.05, -197.5), (8.05, -182.5), (-7.95, -182.5), (-5, -167), (12, -167), (-10.5, -148), (-10.5, -128), (-10.5, -108), (-10.5, -88), (-10.5, -68), (-10.5, -48), (-10.3, -28), (-10.5, -8), (-10.5, 12), (-10.5, 32), (-10.5, 52), (-10.5, 72), (-10.5, 92), (-5, 111), (11, 111)):
            Hole(F_3_0MM_DOWEL_HOLE1_D / 2)


solid = part.part
